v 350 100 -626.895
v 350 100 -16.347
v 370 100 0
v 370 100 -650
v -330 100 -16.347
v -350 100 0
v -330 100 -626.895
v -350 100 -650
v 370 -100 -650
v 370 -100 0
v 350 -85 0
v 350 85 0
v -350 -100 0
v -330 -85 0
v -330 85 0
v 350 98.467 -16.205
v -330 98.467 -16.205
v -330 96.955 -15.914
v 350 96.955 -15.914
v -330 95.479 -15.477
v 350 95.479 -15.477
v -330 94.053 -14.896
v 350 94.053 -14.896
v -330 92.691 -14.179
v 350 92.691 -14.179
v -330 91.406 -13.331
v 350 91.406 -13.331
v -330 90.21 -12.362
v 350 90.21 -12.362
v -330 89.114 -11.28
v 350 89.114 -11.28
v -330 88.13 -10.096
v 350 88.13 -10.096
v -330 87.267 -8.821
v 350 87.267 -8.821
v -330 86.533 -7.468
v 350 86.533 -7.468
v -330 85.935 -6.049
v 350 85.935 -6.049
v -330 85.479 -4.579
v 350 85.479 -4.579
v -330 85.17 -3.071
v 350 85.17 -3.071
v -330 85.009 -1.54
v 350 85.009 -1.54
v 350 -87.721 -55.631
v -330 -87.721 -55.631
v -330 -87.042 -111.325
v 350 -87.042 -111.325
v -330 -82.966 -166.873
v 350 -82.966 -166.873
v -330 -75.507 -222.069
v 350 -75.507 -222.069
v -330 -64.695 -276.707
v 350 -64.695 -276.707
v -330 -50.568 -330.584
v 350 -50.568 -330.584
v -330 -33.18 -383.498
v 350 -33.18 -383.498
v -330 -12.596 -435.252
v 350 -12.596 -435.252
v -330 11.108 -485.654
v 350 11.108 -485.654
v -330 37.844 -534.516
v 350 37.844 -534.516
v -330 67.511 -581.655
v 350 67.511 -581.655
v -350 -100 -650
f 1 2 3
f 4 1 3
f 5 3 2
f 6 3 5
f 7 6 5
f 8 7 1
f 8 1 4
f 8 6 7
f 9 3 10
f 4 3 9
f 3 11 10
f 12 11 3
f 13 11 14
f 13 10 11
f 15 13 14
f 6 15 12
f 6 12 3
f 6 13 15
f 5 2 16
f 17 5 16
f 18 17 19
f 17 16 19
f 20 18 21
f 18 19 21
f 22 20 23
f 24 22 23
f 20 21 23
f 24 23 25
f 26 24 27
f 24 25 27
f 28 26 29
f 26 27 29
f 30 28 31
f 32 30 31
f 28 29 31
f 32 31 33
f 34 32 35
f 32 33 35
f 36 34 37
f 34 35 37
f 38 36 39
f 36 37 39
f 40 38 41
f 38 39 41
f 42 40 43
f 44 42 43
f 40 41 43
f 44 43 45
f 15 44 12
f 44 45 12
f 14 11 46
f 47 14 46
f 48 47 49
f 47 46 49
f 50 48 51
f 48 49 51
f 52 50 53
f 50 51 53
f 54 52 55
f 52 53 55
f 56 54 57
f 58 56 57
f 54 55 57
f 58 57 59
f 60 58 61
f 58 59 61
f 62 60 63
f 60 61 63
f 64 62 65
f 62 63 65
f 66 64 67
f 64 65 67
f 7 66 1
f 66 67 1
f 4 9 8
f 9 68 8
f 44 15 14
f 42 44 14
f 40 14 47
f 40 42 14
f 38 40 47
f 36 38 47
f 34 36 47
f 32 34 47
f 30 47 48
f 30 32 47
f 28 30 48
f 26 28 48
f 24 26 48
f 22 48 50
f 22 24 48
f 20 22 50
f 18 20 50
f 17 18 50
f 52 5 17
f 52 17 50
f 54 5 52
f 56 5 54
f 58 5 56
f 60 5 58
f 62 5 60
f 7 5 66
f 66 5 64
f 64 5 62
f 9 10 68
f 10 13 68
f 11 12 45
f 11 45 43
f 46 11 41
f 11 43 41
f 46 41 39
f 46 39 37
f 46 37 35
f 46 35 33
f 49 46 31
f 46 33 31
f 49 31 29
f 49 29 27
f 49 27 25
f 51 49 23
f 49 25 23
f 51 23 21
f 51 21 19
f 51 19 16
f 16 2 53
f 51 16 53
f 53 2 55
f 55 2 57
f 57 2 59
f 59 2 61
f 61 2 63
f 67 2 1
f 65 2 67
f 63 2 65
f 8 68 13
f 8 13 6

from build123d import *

# Parameters (mm, degrees)
SKETCH1_W           = 700
SKETCH1_H           = 200
BOSS_EXTRUDE1_DEPTH = 650
CUT_EXTRUDE2_DEPTH  = 680
SKETCH7_W           = 650
SKETCH7_H           = 200
BOSS_EXTRUDE3_DEPTH = 20


with BuildPart() as part:
    # Sketch1 → Boss-Extrude1 (new body)
    with BuildSketch(Plane.XY):
        Rectangle(SKETCH1_W, SKETCH1_H)
    extrude(amount=-BOSS_EXTRUDE1_DEPTH)

    # Sketch6 → Cut-Extrude2 (cut)
    with BuildSketch(Plane(origin=(350, 0, 0), x_dir=(0, 0, -1), z_dir=(1, 0, 0))):
        with BuildLine():
            Line((0, 85), (0, -85))
            ThreePointArc((0, -85), (330.583898703, -50.56807643), (626.895433751, 100))
            Line((626.895433751, 100), (16.346883748, 100))
            ThreePointArc((16.346883748, 100), (11.280043592, 89.114449525), (0, 85))
        make_face()
    extrude(amount=-CUT_EXTRUDE2_DEPTH, mode=Mode.SUBTRACT)

    # Sketch7 → Boss-Extrude3 (add)
    with BuildSketch(Plane(origin=(350, 0, 0), x_dir=(0, 0, -1), z_dir=(1, 0, 0))):
        with Locations((325, 0)):
            Rectangle(SKETCH7_W, SKETCH7_H)
    extrude(amount=BOSS_EXTRUDE3_DEPTH)


solid = part.part
